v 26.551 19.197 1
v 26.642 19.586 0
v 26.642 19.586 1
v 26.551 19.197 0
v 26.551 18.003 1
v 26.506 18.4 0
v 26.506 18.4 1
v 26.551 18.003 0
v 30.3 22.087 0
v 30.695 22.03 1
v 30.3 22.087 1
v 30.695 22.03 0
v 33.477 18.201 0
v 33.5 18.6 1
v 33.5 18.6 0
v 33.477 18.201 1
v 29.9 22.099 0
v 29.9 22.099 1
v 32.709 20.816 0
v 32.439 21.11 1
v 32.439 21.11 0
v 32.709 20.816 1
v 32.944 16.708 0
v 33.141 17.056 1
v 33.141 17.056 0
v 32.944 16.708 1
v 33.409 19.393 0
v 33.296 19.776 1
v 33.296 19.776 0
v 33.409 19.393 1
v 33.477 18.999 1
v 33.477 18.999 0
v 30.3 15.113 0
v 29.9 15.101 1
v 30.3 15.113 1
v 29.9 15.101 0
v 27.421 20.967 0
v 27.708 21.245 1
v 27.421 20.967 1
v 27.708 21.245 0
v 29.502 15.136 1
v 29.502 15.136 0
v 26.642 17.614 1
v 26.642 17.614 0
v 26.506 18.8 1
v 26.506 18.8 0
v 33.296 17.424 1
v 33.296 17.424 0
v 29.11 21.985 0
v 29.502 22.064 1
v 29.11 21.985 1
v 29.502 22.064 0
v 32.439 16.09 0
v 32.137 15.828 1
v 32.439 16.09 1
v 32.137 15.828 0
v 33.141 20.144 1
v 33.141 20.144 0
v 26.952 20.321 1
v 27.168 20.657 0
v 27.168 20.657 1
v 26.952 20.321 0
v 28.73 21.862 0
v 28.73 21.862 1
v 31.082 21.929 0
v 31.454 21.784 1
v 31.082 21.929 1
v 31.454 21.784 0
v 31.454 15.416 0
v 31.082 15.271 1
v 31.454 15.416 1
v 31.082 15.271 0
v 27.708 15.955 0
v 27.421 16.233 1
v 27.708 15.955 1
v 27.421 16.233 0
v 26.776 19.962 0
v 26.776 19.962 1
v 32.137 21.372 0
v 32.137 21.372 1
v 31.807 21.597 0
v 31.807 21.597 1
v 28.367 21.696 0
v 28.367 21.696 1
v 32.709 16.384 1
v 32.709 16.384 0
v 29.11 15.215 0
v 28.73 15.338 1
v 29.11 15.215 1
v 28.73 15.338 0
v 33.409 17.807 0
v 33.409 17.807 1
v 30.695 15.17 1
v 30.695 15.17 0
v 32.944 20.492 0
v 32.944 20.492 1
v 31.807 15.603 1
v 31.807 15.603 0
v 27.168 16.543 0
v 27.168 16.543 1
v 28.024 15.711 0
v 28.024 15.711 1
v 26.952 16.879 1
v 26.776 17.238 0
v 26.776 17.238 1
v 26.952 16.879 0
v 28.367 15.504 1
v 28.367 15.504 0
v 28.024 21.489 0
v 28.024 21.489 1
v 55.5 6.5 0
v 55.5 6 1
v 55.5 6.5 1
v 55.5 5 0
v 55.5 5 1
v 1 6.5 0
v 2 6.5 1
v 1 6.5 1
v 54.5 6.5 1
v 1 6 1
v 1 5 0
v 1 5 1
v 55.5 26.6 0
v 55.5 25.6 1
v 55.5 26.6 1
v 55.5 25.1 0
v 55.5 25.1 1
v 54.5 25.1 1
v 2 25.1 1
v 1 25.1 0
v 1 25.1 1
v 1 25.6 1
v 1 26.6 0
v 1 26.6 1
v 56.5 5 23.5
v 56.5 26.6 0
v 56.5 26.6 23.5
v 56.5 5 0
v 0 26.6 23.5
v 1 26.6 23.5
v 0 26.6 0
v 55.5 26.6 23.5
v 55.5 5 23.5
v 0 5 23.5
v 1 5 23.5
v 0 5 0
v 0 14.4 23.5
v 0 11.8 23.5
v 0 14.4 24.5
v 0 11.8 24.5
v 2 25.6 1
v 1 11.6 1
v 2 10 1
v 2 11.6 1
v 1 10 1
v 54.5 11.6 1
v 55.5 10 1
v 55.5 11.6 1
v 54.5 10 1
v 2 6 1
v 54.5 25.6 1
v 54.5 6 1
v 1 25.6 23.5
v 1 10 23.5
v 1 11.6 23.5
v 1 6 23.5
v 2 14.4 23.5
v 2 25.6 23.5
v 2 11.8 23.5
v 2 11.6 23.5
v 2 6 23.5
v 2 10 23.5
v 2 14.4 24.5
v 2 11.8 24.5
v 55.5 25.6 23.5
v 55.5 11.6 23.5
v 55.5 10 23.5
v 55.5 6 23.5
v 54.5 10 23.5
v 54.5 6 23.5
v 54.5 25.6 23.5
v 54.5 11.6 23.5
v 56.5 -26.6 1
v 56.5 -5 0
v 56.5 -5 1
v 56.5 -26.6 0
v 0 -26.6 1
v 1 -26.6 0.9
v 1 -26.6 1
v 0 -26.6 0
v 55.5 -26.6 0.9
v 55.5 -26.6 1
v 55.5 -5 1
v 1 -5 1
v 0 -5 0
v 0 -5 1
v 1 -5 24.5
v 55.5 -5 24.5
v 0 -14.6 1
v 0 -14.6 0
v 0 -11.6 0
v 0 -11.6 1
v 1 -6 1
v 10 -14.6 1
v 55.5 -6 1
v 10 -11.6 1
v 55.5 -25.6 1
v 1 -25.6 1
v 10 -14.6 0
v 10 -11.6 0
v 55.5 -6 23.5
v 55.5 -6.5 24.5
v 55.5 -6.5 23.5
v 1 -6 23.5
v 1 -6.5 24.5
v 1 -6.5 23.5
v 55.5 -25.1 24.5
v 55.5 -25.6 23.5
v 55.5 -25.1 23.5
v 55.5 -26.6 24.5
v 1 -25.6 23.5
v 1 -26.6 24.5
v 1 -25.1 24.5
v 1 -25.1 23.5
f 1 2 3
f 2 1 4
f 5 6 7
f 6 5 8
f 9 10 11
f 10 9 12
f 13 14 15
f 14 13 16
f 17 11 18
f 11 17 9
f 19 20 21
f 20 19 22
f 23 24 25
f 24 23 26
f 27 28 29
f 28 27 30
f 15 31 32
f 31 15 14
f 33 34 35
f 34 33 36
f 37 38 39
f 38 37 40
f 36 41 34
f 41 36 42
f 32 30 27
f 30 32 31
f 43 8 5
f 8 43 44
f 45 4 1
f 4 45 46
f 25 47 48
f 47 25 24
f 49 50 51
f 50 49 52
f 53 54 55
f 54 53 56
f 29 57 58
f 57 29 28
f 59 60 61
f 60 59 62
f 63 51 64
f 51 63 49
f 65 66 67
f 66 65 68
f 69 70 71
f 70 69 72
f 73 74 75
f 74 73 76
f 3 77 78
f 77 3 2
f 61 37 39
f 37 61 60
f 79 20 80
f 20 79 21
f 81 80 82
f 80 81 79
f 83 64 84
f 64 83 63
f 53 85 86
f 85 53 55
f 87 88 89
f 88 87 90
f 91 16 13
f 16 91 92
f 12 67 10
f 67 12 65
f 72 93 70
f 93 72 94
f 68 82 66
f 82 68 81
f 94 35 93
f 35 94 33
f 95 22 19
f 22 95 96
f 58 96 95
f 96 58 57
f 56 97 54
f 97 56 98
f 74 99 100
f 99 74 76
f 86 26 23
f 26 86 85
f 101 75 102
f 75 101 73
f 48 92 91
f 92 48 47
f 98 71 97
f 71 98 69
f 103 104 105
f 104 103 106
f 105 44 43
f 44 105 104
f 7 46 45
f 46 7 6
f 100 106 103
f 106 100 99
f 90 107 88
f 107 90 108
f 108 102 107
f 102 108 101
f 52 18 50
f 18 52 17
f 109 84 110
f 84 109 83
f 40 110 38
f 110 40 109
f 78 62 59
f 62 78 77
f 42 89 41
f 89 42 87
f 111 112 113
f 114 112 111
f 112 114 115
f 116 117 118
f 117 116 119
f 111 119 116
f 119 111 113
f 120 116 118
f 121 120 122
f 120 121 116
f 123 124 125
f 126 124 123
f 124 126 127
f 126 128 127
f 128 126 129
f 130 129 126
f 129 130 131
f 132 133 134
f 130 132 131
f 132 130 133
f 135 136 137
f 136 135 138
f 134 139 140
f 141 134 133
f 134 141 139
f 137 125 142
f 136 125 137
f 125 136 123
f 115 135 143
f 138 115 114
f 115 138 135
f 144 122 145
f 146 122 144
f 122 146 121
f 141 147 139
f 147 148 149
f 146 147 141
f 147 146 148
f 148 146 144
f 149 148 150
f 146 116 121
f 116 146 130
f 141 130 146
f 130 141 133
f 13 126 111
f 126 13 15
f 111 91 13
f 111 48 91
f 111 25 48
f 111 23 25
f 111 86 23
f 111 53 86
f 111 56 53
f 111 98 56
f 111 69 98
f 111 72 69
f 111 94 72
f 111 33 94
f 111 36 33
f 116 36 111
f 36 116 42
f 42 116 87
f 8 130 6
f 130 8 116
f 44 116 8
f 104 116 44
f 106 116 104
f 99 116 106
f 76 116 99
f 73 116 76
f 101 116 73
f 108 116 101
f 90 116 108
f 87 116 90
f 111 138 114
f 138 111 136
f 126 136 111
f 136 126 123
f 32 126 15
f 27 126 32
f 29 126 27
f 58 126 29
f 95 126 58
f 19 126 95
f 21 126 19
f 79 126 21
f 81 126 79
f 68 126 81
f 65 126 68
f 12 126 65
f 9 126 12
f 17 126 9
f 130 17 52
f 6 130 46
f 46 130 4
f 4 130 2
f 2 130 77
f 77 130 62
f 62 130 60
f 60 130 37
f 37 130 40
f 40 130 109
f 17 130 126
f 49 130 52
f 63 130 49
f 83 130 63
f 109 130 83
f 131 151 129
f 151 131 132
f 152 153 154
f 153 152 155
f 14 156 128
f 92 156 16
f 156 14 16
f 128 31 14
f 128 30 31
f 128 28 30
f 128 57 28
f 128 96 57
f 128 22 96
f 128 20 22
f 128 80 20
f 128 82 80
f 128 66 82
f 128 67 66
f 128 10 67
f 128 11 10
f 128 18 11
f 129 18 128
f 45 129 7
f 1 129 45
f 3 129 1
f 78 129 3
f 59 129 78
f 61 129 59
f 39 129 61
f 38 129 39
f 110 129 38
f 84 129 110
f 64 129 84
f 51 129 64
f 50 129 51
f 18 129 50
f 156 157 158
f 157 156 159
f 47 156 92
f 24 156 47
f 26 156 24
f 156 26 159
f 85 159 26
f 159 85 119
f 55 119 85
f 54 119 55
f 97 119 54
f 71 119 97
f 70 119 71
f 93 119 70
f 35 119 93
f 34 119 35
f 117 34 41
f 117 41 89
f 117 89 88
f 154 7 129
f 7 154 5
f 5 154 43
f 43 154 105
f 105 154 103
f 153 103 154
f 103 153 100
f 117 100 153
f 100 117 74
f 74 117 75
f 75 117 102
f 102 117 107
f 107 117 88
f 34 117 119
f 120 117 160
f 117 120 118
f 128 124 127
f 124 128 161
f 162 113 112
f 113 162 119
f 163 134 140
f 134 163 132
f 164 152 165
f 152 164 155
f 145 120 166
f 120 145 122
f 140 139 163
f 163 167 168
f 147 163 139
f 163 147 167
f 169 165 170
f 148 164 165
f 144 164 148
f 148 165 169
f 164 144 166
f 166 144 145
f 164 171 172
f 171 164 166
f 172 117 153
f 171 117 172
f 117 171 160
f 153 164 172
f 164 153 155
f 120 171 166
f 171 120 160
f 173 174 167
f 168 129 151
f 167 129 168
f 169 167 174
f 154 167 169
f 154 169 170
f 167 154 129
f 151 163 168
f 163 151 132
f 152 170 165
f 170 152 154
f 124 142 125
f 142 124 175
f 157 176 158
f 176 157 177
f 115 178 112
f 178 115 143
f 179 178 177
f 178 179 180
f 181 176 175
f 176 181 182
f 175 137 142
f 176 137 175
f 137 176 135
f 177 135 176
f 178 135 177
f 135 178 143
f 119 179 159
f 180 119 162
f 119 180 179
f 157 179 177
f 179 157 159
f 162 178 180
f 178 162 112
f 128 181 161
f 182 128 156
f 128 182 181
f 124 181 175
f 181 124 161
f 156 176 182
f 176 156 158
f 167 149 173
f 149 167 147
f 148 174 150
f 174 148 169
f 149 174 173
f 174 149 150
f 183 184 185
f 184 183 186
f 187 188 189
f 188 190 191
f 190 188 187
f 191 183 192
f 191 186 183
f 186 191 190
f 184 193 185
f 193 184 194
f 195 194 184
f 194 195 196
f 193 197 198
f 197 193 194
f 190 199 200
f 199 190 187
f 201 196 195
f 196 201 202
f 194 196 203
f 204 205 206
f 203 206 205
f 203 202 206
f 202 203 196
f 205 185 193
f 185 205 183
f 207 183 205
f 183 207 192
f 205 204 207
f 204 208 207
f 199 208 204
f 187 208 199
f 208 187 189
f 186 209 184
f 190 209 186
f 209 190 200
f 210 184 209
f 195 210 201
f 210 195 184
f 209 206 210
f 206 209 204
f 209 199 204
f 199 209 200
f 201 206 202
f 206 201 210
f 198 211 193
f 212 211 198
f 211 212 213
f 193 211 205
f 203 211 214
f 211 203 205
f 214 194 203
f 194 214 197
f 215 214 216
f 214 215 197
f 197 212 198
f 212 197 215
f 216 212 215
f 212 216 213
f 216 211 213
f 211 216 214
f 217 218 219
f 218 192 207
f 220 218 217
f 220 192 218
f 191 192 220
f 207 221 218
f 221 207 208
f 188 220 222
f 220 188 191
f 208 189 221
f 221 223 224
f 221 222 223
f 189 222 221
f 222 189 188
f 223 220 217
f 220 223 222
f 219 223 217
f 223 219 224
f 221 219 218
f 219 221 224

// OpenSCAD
// file: Maße.scad
// Gehäuse für Mikrofon Interface, Maße

// Resolution for 3D printing:
$fa = 1;
$fs = 0.4;

// Allgemeines:
delta                  = 0.1; // Standard Durchdringung

// Gehäuse Dicke
gehaeuse_dicke         = 1.0;

// Abmessungen der Platine:
platine_breite         =  54.5; // X
platine_tiefe          =  22.5; // Y
platine_dicke          =   1.6; // Z

// Platz nötig unterhalb der Platine:
platine_bodenfreiheit  =   4.0; 

// Platz nötig oberhalb der Platine:
platine_lichtefreiheit =  14.0;

// Größe der Raste zum Einrasten von Teil 2 in Teil 1
raste_z                =   0.5;

// Kabeldurchführung nach vorne:
aussparung_breite = 10.0;
aussparung_hoehe  =  3.0;
// file: Part2.scad
include <Maße.scad>

module part2_aussparung() {
    translate([-delta, -delta,
               gehaeuse_dicke + platine_bodenfreiheit
             + platine_dicke])
    cube([aussparung_breite + delta, gehaeuse_dicke + 2*delta,
          aussparung_hoehe]);
}

module part2_front_platte() {
    cube([2 * gehaeuse_dicke + platine_breite,
          gehaeuse_dicke,
          2 * gehaeuse_dicke + platine_bodenfreiheit
        + platine_dicke + platine_lichtefreiheit]);
}

module part2_front() {
    difference() {
        part2_front_platte();
        part2_aussparung();
    }
}

module part2_boden() {
    translate([gehaeuse_dicke, gehaeuse_dicke - delta, 0])
        cube([platine_breite, platine_tiefe + delta + gehaeuse_dicke,
              gehaeuse_dicke]);
    // Raste:
    translate([gehaeuse_dicke, platine_tiefe + gehaeuse_dicke,
               gehaeuse_dicke - delta])
        cube([platine_breite, 
              gehaeuse_dicke, raste_z + delta]);
}

module part2_deckel() {
    mirror([0, 0, 1])
        translate([0, 0, 
                - 2 * gehaeuse_dicke - platine_bodenfreiheit
                - platine_dicke - platine_lichtefreiheit])
            part2_boden();
}

module part2() {
    part2_front();
    part2_boden();
    part2_deckel();
}

//part2();
// file: Part1.scad
// Mikrofon Interface - Teil 1:
include <Maße.scad>

// Resolution for 3D printing:
$fa = 1;
$fs = 0.4;

// Steg zur Halterung der Platine
steg_breite =  1.0;

// Loch für die Eingangsbuchse
loch_durchm =  7.0;
loch_z      =  7.0; // Über der Platine
loch_x      = 30.0; // X-Achse relativ zur Platine

module part1_loch() {
    translate([0, gehaeuse_dicke / 2, 0]) {
    rotate([90, 0, 0])
            cylinder(d = loch_durchm,
                     h = gehaeuse_dicke + 2 * delta,
                     center = true);
    }
}

module part1_boden_platte() {
    cube([platine_breite + 2 * gehaeuse_dicke,
          gehaeuse_dicke,
          2 * gehaeuse_dicke + platine_bodenfreiheit
            + platine_dicke + platine_lichtefreiheit]);
}

module part1_boden() {
    difference() {
        part1_boden_platte();
            union() {
                translate([loch_x, 0,
                           gehaeuse_dicke
                         + platine_bodenfreiheit
                         + platine_dicke + loch_z])
                    part1_loch();
                // Untere Aussparung:
                translate([gehaeuse_dicke, -delta, -delta])
                    cube([platine_breite, 
                          gehaeuse_dicke + 2*delta, 
                          gehaeuse_dicke + raste_z +delta]);
                // Obere Aussparung:
                translate([gehaeuse_dicke, -delta,
                           gehaeuse_dicke + platine_bodenfreiheit
                         + platine_dicke + platine_lichtefreiheit
                         - raste_z])
                    cube([platine_breite, 
                          gehaeuse_dicke + 2*delta, 
                          gehaeuse_dicke + raste_z +delta]);
        }
    }
}

module part1_left() {
    translate([0, 0, 0])
        cube([gehaeuse_dicke, platine_tiefe, 
              2 * gehaeuse_dicke + platine_bodenfreiheit
                + platine_dicke + platine_lichtefreiheit]);
    // Steg unten:
    translate([gehaeuse_dicke, 0, gehaeuse_dicke])
        cube([steg_breite, platine_tiefe,
              platine_bodenfreiheit]);
    // Steg oben:
    translate([gehaeuse_dicke, 0, 
               gehaeuse_dicke + platine_bodenfreiheit
               + platine_dicke])
        cube([steg_breite, platine_tiefe,
              platine_lichtefreiheit]);
    
}

module part1_right() {
    translate([platine_breite + 2 * gehaeuse_dicke, 0, 0])
    mirror([1, 0, 0])
        part1_left();
}

abstand = 0.2; // Abstand des Knubbels für die Kabeldurchführung

module part1() {
    translate([0, gehaeuse_dicke, 0]) {
        translate([0, platine_tiefe, 0])
            part1_boden();
        part1_left();
        part1_right();
    }

    translate([0, 0,
               gehaeuse_dicke + platine_bodenfreiheit
             + platine_dicke + abstand]) 
        cube([gehaeuse_dicke + steg_breite, gehaeuse_dicke + delta,
              aussparung_hoehe - 2 * abstand]);
}

//part1();
// main file
include <Part1.scad>
include <Part2.scad>

versatz =   5;

rotate([-90, 0, 0])
    translate([0, - platine_tiefe - 2 * gehaeuse_dicke, versatz])
        part1();
        
color("red", 1.0) {
  rotate([+90, 0, 0])
    translate([0,  0, versatz])
        part2();
}
